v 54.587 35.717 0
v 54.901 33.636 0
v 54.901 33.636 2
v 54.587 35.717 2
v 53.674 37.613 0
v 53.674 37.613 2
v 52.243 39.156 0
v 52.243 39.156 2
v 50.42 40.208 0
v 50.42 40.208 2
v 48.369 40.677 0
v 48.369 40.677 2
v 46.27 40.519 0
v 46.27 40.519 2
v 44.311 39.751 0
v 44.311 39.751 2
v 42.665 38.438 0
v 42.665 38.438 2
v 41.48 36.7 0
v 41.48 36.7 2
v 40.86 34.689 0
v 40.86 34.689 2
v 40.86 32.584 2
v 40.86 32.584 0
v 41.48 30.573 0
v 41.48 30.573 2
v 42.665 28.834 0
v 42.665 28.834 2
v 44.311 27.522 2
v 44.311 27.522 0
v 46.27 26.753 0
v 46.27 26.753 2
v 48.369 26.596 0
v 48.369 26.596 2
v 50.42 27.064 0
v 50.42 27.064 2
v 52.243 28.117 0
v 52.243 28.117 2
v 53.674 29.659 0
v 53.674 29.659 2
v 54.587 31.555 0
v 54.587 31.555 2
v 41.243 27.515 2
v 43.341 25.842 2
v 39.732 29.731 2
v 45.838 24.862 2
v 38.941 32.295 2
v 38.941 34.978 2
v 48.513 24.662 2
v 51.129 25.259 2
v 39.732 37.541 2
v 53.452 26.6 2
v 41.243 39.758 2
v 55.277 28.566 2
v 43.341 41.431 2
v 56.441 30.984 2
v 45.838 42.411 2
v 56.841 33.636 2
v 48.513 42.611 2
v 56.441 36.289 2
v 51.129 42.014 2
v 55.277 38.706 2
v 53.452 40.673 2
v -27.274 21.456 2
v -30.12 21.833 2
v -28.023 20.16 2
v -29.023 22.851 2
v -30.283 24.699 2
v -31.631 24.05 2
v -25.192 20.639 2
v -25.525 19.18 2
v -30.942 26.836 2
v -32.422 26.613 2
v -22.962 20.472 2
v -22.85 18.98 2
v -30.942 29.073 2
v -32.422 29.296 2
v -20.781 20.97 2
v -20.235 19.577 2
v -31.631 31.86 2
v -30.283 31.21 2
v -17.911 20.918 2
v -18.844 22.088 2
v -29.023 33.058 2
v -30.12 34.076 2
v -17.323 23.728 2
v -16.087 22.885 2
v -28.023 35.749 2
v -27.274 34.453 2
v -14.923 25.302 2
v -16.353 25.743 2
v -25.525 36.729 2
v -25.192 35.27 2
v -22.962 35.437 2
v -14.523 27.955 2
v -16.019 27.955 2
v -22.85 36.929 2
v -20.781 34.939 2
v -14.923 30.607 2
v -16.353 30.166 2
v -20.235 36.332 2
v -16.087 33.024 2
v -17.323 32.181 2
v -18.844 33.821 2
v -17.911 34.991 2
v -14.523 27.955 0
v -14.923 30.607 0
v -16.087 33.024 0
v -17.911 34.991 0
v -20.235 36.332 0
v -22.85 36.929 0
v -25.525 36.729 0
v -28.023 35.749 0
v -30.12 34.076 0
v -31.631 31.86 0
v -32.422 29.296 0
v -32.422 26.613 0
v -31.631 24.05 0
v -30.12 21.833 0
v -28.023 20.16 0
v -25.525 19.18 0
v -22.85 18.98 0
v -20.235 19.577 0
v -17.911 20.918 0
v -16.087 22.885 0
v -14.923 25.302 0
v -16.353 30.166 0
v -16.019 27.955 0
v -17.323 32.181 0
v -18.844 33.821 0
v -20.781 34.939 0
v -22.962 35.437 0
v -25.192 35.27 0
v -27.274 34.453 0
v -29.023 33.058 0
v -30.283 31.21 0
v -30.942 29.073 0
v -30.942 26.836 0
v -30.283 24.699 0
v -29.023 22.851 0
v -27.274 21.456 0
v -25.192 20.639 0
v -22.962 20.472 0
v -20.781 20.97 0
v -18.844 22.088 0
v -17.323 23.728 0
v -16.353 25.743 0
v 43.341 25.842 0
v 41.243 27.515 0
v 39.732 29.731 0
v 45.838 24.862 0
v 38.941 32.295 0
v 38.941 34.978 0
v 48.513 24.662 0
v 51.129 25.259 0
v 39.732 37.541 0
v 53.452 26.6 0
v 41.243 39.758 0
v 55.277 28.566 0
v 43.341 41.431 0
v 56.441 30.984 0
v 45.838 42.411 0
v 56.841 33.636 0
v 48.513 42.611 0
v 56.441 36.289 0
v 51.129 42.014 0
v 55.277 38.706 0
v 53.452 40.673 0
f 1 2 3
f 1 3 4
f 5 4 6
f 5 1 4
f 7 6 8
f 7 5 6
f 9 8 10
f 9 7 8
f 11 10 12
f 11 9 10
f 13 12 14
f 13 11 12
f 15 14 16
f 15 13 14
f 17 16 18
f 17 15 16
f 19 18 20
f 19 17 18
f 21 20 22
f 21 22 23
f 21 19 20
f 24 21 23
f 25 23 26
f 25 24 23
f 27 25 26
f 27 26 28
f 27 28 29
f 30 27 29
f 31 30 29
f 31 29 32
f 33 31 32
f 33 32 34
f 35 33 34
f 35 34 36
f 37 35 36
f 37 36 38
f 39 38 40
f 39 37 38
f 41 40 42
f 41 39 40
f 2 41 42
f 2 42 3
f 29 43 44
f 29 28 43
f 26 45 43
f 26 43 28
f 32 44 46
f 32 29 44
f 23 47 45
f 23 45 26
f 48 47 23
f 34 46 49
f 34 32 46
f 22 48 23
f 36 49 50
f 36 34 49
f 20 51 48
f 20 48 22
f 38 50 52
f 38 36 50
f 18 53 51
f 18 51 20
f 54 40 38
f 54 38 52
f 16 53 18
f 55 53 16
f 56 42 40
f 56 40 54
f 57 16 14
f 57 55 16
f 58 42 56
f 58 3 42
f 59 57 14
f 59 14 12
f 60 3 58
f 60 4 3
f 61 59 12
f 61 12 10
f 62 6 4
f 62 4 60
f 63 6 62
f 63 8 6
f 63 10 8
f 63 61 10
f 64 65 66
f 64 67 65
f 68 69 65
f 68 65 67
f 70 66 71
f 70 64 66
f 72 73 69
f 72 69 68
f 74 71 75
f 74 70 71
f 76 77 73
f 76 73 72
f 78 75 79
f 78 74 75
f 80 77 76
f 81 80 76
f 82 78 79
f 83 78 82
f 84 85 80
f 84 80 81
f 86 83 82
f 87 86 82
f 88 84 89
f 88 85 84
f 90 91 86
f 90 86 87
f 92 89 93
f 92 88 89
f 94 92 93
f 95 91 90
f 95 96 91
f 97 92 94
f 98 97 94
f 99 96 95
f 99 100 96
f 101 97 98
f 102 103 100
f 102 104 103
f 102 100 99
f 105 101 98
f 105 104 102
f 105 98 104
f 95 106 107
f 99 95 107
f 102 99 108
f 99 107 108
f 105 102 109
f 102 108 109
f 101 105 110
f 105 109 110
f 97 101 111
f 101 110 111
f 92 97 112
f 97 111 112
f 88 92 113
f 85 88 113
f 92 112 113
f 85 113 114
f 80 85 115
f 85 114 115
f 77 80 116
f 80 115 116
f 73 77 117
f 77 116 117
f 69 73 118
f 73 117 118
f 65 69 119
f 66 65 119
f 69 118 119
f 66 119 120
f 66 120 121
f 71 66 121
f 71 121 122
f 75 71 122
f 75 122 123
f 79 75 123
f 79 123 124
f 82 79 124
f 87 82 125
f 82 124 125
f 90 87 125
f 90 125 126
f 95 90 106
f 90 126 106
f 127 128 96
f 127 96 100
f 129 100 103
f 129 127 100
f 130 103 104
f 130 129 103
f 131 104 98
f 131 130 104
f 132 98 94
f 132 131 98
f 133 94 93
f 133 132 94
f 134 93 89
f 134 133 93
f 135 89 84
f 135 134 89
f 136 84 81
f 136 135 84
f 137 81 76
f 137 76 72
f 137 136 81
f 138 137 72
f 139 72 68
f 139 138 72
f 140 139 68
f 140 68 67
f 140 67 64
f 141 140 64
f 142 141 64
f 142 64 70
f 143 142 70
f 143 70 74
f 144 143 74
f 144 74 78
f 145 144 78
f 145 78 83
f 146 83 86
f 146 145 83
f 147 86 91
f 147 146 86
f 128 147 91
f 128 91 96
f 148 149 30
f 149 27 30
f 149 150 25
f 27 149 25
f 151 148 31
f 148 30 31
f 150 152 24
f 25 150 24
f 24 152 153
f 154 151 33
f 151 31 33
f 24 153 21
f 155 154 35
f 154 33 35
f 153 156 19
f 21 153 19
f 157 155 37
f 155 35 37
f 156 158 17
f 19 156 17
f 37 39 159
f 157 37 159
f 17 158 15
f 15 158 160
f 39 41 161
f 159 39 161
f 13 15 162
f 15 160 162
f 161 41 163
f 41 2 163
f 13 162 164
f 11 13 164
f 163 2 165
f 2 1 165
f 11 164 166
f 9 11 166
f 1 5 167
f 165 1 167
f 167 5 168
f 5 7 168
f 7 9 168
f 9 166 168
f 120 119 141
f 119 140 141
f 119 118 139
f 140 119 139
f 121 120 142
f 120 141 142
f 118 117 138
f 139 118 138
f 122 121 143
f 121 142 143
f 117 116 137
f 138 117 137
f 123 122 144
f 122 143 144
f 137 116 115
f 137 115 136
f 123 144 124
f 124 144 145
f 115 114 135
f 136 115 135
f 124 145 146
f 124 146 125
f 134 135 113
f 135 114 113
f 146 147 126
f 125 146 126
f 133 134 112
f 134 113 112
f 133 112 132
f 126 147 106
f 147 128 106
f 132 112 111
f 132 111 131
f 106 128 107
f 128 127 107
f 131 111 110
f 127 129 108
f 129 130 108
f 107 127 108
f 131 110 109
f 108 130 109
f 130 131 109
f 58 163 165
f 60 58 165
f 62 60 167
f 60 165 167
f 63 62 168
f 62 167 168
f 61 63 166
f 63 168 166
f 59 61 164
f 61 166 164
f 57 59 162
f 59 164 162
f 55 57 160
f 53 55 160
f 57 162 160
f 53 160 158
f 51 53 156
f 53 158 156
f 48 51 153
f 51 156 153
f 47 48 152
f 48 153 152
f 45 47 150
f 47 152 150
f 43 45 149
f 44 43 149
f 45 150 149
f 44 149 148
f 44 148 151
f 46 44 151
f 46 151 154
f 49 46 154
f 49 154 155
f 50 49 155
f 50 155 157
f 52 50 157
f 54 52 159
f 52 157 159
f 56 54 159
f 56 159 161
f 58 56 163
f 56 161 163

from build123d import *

# Parameters (mm, degrees)
F0_R     = 9
F0_R_2   = 7.503443
F1_DEPTH = 2
F0_R_3   = 7.060099
F2_DEPTH = 2


with BuildPart() as f1:
    # F0 (on Top) → F1 (new body)
    with BuildSketch(Plane.XY):
        with Locations((-23.522729, 27.954547)):
            Circle(F0_R)
        with Locations((-23.522729, 27.954547)):
            Circle(F0_R_2, mode=Mode.SUBTRACT)
    extrude(amount=F1_DEPTH)


with BuildPart() as f2:
    # F0 (on Top) → F2 (new body)
    with BuildSketch(Plane.XY):
        with Locations((47.840912, 33.636365)):
            Circle(F0_R)
        with Locations((47.840912, 33.636365)):
            Circle(F0_R_3, mode=Mode.SUBTRACT)
    extrude(amount=F2_DEPTH)


solid = Compound([f1.part, f2.part])
